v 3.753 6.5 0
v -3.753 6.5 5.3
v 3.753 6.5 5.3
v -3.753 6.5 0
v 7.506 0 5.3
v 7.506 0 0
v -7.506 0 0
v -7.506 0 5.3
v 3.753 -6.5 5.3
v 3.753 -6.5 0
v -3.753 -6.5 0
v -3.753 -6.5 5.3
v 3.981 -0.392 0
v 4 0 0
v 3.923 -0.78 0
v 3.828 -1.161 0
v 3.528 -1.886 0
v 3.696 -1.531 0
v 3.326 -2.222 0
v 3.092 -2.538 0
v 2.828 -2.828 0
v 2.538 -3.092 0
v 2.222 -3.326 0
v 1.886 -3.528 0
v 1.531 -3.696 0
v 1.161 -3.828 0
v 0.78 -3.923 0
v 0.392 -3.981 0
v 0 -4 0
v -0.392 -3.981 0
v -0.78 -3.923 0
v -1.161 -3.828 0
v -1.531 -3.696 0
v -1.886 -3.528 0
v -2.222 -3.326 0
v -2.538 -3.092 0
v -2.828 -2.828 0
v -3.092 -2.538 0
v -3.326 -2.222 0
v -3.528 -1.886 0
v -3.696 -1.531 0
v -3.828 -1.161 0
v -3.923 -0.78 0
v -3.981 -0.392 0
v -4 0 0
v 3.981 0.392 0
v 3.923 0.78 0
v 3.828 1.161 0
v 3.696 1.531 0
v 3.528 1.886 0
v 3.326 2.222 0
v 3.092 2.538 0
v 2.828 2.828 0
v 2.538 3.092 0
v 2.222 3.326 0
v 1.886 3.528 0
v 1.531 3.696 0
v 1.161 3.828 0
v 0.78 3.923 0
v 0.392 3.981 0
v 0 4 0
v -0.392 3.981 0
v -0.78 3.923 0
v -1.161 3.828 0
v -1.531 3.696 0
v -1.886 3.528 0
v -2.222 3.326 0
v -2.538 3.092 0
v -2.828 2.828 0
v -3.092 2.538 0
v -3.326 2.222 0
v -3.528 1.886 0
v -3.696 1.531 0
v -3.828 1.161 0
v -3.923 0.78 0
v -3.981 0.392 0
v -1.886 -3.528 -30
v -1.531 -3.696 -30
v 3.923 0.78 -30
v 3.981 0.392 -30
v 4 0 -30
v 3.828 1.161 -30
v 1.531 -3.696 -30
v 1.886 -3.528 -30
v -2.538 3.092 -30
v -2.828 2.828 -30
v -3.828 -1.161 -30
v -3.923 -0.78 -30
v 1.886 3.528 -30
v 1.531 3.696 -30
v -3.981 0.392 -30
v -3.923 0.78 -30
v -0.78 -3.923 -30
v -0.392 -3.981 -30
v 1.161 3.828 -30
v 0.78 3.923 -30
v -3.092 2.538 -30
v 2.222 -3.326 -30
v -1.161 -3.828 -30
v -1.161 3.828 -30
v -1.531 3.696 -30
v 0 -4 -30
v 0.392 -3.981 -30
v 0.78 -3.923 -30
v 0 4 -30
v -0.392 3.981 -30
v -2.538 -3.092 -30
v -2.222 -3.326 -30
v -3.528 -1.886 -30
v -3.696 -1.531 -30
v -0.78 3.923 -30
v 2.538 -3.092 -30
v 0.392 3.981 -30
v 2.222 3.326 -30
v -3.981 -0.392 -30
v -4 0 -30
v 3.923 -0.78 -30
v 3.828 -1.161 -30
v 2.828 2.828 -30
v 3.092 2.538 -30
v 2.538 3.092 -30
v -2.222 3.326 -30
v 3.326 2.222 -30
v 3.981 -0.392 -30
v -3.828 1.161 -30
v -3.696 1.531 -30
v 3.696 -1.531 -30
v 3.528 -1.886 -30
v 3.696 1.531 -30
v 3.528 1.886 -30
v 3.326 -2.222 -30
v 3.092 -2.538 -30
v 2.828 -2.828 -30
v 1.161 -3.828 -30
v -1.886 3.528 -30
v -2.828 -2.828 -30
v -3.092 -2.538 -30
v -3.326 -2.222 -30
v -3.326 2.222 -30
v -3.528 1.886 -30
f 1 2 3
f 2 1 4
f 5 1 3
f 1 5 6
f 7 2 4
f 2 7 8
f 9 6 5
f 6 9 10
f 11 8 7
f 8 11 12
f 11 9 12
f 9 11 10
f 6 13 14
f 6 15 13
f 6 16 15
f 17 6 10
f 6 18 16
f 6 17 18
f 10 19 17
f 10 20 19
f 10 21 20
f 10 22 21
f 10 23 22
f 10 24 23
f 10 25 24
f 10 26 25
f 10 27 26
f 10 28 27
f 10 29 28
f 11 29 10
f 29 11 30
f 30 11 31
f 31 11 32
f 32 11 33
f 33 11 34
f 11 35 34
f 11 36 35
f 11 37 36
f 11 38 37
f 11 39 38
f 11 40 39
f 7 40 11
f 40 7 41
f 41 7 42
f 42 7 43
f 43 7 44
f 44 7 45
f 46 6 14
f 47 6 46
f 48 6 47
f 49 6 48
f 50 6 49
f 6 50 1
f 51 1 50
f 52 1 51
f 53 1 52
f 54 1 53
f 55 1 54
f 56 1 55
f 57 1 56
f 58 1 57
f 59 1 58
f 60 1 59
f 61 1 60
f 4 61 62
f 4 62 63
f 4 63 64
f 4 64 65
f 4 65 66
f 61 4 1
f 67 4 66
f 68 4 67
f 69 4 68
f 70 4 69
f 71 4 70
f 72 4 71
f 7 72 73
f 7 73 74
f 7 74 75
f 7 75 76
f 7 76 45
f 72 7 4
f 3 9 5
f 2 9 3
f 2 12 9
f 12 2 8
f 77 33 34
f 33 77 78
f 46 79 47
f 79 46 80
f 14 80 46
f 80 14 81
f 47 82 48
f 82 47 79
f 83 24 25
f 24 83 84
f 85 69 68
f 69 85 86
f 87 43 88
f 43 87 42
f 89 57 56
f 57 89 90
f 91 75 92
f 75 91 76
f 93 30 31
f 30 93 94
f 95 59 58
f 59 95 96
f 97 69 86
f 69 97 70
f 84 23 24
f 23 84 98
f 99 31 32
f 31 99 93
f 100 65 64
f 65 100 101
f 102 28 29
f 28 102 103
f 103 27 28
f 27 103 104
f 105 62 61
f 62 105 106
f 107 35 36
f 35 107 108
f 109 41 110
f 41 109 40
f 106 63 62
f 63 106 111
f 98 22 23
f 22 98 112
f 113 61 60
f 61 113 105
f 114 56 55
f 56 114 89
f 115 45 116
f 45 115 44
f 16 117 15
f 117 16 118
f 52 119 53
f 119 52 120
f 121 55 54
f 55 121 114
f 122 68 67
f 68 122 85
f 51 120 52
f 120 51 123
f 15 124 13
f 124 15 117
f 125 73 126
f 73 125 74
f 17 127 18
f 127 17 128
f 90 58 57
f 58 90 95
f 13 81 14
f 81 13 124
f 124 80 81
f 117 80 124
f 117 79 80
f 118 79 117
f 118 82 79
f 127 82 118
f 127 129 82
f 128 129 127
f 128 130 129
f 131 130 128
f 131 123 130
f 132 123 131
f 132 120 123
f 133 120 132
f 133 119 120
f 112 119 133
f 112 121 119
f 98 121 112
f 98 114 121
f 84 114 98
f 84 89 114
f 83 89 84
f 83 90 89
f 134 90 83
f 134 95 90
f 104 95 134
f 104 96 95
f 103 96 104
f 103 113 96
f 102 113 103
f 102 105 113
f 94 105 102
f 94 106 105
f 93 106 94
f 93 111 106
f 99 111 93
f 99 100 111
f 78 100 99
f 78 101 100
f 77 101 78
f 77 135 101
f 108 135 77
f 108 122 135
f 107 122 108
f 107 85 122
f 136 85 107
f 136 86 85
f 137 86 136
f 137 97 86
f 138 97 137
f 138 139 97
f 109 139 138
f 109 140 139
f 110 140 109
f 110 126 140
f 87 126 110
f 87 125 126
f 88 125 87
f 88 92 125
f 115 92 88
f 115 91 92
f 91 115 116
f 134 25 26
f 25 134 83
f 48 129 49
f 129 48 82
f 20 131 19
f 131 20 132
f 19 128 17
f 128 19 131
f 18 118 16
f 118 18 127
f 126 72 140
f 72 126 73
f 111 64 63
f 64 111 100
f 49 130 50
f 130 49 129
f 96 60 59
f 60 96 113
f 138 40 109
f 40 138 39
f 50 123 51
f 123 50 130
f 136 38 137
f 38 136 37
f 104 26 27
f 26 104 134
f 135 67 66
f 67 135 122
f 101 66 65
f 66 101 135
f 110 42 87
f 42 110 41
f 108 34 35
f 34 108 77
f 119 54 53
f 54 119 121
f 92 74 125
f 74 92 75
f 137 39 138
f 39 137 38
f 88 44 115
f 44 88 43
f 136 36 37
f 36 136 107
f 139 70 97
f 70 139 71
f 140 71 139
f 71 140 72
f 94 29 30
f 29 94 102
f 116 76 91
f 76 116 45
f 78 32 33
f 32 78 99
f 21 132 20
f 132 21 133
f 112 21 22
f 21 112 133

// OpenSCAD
// M8規格準拠の六角ボルト（頭部 hex 5.3mm high, シャンク 直径8mm 長さ30mm, 中心軸 = +Z, 頭部底面 z=0）

// 定数
R = 13 / sqrt(3); // hex の circumradius（ across-flats = 13mm を満たす）
head_height = 5.3;
shank_d = 8;
shank_r = shank_d / 2;
shank_h = 30;

// 六角形の頂点（中心を原点、正のX軸方向に頂点を置くよう配置）
points = [
  [ R, 0 ],
  [ R/2, R*sqrt(3)/2 ],
  [ -R/2, R*sqrt(3)/2 ],
  [ -R, 0 ],
  [ -R/2, -R*sqrt(3)/2 ],
  [ R/2, -R*sqrt(3)/2 ]
];

// ヘッド部（底面を z=0 に配置、+Z方向に伸長）
module head() {
  linear_extrude(height = head_height) polygon(points);
}

// シャンク部（底辺を z=0 から -30 まで、中心軸は +Z）
module shank() {
  translate([0, 0, -shank_h])
    cylinder(h = shank_h, r = shank_r, center = false, $fn = 64);
}

// 組み立て
union() {
  head();          // z = 0 〜 head_height
  shank();         // z = -30 〜 0
}
